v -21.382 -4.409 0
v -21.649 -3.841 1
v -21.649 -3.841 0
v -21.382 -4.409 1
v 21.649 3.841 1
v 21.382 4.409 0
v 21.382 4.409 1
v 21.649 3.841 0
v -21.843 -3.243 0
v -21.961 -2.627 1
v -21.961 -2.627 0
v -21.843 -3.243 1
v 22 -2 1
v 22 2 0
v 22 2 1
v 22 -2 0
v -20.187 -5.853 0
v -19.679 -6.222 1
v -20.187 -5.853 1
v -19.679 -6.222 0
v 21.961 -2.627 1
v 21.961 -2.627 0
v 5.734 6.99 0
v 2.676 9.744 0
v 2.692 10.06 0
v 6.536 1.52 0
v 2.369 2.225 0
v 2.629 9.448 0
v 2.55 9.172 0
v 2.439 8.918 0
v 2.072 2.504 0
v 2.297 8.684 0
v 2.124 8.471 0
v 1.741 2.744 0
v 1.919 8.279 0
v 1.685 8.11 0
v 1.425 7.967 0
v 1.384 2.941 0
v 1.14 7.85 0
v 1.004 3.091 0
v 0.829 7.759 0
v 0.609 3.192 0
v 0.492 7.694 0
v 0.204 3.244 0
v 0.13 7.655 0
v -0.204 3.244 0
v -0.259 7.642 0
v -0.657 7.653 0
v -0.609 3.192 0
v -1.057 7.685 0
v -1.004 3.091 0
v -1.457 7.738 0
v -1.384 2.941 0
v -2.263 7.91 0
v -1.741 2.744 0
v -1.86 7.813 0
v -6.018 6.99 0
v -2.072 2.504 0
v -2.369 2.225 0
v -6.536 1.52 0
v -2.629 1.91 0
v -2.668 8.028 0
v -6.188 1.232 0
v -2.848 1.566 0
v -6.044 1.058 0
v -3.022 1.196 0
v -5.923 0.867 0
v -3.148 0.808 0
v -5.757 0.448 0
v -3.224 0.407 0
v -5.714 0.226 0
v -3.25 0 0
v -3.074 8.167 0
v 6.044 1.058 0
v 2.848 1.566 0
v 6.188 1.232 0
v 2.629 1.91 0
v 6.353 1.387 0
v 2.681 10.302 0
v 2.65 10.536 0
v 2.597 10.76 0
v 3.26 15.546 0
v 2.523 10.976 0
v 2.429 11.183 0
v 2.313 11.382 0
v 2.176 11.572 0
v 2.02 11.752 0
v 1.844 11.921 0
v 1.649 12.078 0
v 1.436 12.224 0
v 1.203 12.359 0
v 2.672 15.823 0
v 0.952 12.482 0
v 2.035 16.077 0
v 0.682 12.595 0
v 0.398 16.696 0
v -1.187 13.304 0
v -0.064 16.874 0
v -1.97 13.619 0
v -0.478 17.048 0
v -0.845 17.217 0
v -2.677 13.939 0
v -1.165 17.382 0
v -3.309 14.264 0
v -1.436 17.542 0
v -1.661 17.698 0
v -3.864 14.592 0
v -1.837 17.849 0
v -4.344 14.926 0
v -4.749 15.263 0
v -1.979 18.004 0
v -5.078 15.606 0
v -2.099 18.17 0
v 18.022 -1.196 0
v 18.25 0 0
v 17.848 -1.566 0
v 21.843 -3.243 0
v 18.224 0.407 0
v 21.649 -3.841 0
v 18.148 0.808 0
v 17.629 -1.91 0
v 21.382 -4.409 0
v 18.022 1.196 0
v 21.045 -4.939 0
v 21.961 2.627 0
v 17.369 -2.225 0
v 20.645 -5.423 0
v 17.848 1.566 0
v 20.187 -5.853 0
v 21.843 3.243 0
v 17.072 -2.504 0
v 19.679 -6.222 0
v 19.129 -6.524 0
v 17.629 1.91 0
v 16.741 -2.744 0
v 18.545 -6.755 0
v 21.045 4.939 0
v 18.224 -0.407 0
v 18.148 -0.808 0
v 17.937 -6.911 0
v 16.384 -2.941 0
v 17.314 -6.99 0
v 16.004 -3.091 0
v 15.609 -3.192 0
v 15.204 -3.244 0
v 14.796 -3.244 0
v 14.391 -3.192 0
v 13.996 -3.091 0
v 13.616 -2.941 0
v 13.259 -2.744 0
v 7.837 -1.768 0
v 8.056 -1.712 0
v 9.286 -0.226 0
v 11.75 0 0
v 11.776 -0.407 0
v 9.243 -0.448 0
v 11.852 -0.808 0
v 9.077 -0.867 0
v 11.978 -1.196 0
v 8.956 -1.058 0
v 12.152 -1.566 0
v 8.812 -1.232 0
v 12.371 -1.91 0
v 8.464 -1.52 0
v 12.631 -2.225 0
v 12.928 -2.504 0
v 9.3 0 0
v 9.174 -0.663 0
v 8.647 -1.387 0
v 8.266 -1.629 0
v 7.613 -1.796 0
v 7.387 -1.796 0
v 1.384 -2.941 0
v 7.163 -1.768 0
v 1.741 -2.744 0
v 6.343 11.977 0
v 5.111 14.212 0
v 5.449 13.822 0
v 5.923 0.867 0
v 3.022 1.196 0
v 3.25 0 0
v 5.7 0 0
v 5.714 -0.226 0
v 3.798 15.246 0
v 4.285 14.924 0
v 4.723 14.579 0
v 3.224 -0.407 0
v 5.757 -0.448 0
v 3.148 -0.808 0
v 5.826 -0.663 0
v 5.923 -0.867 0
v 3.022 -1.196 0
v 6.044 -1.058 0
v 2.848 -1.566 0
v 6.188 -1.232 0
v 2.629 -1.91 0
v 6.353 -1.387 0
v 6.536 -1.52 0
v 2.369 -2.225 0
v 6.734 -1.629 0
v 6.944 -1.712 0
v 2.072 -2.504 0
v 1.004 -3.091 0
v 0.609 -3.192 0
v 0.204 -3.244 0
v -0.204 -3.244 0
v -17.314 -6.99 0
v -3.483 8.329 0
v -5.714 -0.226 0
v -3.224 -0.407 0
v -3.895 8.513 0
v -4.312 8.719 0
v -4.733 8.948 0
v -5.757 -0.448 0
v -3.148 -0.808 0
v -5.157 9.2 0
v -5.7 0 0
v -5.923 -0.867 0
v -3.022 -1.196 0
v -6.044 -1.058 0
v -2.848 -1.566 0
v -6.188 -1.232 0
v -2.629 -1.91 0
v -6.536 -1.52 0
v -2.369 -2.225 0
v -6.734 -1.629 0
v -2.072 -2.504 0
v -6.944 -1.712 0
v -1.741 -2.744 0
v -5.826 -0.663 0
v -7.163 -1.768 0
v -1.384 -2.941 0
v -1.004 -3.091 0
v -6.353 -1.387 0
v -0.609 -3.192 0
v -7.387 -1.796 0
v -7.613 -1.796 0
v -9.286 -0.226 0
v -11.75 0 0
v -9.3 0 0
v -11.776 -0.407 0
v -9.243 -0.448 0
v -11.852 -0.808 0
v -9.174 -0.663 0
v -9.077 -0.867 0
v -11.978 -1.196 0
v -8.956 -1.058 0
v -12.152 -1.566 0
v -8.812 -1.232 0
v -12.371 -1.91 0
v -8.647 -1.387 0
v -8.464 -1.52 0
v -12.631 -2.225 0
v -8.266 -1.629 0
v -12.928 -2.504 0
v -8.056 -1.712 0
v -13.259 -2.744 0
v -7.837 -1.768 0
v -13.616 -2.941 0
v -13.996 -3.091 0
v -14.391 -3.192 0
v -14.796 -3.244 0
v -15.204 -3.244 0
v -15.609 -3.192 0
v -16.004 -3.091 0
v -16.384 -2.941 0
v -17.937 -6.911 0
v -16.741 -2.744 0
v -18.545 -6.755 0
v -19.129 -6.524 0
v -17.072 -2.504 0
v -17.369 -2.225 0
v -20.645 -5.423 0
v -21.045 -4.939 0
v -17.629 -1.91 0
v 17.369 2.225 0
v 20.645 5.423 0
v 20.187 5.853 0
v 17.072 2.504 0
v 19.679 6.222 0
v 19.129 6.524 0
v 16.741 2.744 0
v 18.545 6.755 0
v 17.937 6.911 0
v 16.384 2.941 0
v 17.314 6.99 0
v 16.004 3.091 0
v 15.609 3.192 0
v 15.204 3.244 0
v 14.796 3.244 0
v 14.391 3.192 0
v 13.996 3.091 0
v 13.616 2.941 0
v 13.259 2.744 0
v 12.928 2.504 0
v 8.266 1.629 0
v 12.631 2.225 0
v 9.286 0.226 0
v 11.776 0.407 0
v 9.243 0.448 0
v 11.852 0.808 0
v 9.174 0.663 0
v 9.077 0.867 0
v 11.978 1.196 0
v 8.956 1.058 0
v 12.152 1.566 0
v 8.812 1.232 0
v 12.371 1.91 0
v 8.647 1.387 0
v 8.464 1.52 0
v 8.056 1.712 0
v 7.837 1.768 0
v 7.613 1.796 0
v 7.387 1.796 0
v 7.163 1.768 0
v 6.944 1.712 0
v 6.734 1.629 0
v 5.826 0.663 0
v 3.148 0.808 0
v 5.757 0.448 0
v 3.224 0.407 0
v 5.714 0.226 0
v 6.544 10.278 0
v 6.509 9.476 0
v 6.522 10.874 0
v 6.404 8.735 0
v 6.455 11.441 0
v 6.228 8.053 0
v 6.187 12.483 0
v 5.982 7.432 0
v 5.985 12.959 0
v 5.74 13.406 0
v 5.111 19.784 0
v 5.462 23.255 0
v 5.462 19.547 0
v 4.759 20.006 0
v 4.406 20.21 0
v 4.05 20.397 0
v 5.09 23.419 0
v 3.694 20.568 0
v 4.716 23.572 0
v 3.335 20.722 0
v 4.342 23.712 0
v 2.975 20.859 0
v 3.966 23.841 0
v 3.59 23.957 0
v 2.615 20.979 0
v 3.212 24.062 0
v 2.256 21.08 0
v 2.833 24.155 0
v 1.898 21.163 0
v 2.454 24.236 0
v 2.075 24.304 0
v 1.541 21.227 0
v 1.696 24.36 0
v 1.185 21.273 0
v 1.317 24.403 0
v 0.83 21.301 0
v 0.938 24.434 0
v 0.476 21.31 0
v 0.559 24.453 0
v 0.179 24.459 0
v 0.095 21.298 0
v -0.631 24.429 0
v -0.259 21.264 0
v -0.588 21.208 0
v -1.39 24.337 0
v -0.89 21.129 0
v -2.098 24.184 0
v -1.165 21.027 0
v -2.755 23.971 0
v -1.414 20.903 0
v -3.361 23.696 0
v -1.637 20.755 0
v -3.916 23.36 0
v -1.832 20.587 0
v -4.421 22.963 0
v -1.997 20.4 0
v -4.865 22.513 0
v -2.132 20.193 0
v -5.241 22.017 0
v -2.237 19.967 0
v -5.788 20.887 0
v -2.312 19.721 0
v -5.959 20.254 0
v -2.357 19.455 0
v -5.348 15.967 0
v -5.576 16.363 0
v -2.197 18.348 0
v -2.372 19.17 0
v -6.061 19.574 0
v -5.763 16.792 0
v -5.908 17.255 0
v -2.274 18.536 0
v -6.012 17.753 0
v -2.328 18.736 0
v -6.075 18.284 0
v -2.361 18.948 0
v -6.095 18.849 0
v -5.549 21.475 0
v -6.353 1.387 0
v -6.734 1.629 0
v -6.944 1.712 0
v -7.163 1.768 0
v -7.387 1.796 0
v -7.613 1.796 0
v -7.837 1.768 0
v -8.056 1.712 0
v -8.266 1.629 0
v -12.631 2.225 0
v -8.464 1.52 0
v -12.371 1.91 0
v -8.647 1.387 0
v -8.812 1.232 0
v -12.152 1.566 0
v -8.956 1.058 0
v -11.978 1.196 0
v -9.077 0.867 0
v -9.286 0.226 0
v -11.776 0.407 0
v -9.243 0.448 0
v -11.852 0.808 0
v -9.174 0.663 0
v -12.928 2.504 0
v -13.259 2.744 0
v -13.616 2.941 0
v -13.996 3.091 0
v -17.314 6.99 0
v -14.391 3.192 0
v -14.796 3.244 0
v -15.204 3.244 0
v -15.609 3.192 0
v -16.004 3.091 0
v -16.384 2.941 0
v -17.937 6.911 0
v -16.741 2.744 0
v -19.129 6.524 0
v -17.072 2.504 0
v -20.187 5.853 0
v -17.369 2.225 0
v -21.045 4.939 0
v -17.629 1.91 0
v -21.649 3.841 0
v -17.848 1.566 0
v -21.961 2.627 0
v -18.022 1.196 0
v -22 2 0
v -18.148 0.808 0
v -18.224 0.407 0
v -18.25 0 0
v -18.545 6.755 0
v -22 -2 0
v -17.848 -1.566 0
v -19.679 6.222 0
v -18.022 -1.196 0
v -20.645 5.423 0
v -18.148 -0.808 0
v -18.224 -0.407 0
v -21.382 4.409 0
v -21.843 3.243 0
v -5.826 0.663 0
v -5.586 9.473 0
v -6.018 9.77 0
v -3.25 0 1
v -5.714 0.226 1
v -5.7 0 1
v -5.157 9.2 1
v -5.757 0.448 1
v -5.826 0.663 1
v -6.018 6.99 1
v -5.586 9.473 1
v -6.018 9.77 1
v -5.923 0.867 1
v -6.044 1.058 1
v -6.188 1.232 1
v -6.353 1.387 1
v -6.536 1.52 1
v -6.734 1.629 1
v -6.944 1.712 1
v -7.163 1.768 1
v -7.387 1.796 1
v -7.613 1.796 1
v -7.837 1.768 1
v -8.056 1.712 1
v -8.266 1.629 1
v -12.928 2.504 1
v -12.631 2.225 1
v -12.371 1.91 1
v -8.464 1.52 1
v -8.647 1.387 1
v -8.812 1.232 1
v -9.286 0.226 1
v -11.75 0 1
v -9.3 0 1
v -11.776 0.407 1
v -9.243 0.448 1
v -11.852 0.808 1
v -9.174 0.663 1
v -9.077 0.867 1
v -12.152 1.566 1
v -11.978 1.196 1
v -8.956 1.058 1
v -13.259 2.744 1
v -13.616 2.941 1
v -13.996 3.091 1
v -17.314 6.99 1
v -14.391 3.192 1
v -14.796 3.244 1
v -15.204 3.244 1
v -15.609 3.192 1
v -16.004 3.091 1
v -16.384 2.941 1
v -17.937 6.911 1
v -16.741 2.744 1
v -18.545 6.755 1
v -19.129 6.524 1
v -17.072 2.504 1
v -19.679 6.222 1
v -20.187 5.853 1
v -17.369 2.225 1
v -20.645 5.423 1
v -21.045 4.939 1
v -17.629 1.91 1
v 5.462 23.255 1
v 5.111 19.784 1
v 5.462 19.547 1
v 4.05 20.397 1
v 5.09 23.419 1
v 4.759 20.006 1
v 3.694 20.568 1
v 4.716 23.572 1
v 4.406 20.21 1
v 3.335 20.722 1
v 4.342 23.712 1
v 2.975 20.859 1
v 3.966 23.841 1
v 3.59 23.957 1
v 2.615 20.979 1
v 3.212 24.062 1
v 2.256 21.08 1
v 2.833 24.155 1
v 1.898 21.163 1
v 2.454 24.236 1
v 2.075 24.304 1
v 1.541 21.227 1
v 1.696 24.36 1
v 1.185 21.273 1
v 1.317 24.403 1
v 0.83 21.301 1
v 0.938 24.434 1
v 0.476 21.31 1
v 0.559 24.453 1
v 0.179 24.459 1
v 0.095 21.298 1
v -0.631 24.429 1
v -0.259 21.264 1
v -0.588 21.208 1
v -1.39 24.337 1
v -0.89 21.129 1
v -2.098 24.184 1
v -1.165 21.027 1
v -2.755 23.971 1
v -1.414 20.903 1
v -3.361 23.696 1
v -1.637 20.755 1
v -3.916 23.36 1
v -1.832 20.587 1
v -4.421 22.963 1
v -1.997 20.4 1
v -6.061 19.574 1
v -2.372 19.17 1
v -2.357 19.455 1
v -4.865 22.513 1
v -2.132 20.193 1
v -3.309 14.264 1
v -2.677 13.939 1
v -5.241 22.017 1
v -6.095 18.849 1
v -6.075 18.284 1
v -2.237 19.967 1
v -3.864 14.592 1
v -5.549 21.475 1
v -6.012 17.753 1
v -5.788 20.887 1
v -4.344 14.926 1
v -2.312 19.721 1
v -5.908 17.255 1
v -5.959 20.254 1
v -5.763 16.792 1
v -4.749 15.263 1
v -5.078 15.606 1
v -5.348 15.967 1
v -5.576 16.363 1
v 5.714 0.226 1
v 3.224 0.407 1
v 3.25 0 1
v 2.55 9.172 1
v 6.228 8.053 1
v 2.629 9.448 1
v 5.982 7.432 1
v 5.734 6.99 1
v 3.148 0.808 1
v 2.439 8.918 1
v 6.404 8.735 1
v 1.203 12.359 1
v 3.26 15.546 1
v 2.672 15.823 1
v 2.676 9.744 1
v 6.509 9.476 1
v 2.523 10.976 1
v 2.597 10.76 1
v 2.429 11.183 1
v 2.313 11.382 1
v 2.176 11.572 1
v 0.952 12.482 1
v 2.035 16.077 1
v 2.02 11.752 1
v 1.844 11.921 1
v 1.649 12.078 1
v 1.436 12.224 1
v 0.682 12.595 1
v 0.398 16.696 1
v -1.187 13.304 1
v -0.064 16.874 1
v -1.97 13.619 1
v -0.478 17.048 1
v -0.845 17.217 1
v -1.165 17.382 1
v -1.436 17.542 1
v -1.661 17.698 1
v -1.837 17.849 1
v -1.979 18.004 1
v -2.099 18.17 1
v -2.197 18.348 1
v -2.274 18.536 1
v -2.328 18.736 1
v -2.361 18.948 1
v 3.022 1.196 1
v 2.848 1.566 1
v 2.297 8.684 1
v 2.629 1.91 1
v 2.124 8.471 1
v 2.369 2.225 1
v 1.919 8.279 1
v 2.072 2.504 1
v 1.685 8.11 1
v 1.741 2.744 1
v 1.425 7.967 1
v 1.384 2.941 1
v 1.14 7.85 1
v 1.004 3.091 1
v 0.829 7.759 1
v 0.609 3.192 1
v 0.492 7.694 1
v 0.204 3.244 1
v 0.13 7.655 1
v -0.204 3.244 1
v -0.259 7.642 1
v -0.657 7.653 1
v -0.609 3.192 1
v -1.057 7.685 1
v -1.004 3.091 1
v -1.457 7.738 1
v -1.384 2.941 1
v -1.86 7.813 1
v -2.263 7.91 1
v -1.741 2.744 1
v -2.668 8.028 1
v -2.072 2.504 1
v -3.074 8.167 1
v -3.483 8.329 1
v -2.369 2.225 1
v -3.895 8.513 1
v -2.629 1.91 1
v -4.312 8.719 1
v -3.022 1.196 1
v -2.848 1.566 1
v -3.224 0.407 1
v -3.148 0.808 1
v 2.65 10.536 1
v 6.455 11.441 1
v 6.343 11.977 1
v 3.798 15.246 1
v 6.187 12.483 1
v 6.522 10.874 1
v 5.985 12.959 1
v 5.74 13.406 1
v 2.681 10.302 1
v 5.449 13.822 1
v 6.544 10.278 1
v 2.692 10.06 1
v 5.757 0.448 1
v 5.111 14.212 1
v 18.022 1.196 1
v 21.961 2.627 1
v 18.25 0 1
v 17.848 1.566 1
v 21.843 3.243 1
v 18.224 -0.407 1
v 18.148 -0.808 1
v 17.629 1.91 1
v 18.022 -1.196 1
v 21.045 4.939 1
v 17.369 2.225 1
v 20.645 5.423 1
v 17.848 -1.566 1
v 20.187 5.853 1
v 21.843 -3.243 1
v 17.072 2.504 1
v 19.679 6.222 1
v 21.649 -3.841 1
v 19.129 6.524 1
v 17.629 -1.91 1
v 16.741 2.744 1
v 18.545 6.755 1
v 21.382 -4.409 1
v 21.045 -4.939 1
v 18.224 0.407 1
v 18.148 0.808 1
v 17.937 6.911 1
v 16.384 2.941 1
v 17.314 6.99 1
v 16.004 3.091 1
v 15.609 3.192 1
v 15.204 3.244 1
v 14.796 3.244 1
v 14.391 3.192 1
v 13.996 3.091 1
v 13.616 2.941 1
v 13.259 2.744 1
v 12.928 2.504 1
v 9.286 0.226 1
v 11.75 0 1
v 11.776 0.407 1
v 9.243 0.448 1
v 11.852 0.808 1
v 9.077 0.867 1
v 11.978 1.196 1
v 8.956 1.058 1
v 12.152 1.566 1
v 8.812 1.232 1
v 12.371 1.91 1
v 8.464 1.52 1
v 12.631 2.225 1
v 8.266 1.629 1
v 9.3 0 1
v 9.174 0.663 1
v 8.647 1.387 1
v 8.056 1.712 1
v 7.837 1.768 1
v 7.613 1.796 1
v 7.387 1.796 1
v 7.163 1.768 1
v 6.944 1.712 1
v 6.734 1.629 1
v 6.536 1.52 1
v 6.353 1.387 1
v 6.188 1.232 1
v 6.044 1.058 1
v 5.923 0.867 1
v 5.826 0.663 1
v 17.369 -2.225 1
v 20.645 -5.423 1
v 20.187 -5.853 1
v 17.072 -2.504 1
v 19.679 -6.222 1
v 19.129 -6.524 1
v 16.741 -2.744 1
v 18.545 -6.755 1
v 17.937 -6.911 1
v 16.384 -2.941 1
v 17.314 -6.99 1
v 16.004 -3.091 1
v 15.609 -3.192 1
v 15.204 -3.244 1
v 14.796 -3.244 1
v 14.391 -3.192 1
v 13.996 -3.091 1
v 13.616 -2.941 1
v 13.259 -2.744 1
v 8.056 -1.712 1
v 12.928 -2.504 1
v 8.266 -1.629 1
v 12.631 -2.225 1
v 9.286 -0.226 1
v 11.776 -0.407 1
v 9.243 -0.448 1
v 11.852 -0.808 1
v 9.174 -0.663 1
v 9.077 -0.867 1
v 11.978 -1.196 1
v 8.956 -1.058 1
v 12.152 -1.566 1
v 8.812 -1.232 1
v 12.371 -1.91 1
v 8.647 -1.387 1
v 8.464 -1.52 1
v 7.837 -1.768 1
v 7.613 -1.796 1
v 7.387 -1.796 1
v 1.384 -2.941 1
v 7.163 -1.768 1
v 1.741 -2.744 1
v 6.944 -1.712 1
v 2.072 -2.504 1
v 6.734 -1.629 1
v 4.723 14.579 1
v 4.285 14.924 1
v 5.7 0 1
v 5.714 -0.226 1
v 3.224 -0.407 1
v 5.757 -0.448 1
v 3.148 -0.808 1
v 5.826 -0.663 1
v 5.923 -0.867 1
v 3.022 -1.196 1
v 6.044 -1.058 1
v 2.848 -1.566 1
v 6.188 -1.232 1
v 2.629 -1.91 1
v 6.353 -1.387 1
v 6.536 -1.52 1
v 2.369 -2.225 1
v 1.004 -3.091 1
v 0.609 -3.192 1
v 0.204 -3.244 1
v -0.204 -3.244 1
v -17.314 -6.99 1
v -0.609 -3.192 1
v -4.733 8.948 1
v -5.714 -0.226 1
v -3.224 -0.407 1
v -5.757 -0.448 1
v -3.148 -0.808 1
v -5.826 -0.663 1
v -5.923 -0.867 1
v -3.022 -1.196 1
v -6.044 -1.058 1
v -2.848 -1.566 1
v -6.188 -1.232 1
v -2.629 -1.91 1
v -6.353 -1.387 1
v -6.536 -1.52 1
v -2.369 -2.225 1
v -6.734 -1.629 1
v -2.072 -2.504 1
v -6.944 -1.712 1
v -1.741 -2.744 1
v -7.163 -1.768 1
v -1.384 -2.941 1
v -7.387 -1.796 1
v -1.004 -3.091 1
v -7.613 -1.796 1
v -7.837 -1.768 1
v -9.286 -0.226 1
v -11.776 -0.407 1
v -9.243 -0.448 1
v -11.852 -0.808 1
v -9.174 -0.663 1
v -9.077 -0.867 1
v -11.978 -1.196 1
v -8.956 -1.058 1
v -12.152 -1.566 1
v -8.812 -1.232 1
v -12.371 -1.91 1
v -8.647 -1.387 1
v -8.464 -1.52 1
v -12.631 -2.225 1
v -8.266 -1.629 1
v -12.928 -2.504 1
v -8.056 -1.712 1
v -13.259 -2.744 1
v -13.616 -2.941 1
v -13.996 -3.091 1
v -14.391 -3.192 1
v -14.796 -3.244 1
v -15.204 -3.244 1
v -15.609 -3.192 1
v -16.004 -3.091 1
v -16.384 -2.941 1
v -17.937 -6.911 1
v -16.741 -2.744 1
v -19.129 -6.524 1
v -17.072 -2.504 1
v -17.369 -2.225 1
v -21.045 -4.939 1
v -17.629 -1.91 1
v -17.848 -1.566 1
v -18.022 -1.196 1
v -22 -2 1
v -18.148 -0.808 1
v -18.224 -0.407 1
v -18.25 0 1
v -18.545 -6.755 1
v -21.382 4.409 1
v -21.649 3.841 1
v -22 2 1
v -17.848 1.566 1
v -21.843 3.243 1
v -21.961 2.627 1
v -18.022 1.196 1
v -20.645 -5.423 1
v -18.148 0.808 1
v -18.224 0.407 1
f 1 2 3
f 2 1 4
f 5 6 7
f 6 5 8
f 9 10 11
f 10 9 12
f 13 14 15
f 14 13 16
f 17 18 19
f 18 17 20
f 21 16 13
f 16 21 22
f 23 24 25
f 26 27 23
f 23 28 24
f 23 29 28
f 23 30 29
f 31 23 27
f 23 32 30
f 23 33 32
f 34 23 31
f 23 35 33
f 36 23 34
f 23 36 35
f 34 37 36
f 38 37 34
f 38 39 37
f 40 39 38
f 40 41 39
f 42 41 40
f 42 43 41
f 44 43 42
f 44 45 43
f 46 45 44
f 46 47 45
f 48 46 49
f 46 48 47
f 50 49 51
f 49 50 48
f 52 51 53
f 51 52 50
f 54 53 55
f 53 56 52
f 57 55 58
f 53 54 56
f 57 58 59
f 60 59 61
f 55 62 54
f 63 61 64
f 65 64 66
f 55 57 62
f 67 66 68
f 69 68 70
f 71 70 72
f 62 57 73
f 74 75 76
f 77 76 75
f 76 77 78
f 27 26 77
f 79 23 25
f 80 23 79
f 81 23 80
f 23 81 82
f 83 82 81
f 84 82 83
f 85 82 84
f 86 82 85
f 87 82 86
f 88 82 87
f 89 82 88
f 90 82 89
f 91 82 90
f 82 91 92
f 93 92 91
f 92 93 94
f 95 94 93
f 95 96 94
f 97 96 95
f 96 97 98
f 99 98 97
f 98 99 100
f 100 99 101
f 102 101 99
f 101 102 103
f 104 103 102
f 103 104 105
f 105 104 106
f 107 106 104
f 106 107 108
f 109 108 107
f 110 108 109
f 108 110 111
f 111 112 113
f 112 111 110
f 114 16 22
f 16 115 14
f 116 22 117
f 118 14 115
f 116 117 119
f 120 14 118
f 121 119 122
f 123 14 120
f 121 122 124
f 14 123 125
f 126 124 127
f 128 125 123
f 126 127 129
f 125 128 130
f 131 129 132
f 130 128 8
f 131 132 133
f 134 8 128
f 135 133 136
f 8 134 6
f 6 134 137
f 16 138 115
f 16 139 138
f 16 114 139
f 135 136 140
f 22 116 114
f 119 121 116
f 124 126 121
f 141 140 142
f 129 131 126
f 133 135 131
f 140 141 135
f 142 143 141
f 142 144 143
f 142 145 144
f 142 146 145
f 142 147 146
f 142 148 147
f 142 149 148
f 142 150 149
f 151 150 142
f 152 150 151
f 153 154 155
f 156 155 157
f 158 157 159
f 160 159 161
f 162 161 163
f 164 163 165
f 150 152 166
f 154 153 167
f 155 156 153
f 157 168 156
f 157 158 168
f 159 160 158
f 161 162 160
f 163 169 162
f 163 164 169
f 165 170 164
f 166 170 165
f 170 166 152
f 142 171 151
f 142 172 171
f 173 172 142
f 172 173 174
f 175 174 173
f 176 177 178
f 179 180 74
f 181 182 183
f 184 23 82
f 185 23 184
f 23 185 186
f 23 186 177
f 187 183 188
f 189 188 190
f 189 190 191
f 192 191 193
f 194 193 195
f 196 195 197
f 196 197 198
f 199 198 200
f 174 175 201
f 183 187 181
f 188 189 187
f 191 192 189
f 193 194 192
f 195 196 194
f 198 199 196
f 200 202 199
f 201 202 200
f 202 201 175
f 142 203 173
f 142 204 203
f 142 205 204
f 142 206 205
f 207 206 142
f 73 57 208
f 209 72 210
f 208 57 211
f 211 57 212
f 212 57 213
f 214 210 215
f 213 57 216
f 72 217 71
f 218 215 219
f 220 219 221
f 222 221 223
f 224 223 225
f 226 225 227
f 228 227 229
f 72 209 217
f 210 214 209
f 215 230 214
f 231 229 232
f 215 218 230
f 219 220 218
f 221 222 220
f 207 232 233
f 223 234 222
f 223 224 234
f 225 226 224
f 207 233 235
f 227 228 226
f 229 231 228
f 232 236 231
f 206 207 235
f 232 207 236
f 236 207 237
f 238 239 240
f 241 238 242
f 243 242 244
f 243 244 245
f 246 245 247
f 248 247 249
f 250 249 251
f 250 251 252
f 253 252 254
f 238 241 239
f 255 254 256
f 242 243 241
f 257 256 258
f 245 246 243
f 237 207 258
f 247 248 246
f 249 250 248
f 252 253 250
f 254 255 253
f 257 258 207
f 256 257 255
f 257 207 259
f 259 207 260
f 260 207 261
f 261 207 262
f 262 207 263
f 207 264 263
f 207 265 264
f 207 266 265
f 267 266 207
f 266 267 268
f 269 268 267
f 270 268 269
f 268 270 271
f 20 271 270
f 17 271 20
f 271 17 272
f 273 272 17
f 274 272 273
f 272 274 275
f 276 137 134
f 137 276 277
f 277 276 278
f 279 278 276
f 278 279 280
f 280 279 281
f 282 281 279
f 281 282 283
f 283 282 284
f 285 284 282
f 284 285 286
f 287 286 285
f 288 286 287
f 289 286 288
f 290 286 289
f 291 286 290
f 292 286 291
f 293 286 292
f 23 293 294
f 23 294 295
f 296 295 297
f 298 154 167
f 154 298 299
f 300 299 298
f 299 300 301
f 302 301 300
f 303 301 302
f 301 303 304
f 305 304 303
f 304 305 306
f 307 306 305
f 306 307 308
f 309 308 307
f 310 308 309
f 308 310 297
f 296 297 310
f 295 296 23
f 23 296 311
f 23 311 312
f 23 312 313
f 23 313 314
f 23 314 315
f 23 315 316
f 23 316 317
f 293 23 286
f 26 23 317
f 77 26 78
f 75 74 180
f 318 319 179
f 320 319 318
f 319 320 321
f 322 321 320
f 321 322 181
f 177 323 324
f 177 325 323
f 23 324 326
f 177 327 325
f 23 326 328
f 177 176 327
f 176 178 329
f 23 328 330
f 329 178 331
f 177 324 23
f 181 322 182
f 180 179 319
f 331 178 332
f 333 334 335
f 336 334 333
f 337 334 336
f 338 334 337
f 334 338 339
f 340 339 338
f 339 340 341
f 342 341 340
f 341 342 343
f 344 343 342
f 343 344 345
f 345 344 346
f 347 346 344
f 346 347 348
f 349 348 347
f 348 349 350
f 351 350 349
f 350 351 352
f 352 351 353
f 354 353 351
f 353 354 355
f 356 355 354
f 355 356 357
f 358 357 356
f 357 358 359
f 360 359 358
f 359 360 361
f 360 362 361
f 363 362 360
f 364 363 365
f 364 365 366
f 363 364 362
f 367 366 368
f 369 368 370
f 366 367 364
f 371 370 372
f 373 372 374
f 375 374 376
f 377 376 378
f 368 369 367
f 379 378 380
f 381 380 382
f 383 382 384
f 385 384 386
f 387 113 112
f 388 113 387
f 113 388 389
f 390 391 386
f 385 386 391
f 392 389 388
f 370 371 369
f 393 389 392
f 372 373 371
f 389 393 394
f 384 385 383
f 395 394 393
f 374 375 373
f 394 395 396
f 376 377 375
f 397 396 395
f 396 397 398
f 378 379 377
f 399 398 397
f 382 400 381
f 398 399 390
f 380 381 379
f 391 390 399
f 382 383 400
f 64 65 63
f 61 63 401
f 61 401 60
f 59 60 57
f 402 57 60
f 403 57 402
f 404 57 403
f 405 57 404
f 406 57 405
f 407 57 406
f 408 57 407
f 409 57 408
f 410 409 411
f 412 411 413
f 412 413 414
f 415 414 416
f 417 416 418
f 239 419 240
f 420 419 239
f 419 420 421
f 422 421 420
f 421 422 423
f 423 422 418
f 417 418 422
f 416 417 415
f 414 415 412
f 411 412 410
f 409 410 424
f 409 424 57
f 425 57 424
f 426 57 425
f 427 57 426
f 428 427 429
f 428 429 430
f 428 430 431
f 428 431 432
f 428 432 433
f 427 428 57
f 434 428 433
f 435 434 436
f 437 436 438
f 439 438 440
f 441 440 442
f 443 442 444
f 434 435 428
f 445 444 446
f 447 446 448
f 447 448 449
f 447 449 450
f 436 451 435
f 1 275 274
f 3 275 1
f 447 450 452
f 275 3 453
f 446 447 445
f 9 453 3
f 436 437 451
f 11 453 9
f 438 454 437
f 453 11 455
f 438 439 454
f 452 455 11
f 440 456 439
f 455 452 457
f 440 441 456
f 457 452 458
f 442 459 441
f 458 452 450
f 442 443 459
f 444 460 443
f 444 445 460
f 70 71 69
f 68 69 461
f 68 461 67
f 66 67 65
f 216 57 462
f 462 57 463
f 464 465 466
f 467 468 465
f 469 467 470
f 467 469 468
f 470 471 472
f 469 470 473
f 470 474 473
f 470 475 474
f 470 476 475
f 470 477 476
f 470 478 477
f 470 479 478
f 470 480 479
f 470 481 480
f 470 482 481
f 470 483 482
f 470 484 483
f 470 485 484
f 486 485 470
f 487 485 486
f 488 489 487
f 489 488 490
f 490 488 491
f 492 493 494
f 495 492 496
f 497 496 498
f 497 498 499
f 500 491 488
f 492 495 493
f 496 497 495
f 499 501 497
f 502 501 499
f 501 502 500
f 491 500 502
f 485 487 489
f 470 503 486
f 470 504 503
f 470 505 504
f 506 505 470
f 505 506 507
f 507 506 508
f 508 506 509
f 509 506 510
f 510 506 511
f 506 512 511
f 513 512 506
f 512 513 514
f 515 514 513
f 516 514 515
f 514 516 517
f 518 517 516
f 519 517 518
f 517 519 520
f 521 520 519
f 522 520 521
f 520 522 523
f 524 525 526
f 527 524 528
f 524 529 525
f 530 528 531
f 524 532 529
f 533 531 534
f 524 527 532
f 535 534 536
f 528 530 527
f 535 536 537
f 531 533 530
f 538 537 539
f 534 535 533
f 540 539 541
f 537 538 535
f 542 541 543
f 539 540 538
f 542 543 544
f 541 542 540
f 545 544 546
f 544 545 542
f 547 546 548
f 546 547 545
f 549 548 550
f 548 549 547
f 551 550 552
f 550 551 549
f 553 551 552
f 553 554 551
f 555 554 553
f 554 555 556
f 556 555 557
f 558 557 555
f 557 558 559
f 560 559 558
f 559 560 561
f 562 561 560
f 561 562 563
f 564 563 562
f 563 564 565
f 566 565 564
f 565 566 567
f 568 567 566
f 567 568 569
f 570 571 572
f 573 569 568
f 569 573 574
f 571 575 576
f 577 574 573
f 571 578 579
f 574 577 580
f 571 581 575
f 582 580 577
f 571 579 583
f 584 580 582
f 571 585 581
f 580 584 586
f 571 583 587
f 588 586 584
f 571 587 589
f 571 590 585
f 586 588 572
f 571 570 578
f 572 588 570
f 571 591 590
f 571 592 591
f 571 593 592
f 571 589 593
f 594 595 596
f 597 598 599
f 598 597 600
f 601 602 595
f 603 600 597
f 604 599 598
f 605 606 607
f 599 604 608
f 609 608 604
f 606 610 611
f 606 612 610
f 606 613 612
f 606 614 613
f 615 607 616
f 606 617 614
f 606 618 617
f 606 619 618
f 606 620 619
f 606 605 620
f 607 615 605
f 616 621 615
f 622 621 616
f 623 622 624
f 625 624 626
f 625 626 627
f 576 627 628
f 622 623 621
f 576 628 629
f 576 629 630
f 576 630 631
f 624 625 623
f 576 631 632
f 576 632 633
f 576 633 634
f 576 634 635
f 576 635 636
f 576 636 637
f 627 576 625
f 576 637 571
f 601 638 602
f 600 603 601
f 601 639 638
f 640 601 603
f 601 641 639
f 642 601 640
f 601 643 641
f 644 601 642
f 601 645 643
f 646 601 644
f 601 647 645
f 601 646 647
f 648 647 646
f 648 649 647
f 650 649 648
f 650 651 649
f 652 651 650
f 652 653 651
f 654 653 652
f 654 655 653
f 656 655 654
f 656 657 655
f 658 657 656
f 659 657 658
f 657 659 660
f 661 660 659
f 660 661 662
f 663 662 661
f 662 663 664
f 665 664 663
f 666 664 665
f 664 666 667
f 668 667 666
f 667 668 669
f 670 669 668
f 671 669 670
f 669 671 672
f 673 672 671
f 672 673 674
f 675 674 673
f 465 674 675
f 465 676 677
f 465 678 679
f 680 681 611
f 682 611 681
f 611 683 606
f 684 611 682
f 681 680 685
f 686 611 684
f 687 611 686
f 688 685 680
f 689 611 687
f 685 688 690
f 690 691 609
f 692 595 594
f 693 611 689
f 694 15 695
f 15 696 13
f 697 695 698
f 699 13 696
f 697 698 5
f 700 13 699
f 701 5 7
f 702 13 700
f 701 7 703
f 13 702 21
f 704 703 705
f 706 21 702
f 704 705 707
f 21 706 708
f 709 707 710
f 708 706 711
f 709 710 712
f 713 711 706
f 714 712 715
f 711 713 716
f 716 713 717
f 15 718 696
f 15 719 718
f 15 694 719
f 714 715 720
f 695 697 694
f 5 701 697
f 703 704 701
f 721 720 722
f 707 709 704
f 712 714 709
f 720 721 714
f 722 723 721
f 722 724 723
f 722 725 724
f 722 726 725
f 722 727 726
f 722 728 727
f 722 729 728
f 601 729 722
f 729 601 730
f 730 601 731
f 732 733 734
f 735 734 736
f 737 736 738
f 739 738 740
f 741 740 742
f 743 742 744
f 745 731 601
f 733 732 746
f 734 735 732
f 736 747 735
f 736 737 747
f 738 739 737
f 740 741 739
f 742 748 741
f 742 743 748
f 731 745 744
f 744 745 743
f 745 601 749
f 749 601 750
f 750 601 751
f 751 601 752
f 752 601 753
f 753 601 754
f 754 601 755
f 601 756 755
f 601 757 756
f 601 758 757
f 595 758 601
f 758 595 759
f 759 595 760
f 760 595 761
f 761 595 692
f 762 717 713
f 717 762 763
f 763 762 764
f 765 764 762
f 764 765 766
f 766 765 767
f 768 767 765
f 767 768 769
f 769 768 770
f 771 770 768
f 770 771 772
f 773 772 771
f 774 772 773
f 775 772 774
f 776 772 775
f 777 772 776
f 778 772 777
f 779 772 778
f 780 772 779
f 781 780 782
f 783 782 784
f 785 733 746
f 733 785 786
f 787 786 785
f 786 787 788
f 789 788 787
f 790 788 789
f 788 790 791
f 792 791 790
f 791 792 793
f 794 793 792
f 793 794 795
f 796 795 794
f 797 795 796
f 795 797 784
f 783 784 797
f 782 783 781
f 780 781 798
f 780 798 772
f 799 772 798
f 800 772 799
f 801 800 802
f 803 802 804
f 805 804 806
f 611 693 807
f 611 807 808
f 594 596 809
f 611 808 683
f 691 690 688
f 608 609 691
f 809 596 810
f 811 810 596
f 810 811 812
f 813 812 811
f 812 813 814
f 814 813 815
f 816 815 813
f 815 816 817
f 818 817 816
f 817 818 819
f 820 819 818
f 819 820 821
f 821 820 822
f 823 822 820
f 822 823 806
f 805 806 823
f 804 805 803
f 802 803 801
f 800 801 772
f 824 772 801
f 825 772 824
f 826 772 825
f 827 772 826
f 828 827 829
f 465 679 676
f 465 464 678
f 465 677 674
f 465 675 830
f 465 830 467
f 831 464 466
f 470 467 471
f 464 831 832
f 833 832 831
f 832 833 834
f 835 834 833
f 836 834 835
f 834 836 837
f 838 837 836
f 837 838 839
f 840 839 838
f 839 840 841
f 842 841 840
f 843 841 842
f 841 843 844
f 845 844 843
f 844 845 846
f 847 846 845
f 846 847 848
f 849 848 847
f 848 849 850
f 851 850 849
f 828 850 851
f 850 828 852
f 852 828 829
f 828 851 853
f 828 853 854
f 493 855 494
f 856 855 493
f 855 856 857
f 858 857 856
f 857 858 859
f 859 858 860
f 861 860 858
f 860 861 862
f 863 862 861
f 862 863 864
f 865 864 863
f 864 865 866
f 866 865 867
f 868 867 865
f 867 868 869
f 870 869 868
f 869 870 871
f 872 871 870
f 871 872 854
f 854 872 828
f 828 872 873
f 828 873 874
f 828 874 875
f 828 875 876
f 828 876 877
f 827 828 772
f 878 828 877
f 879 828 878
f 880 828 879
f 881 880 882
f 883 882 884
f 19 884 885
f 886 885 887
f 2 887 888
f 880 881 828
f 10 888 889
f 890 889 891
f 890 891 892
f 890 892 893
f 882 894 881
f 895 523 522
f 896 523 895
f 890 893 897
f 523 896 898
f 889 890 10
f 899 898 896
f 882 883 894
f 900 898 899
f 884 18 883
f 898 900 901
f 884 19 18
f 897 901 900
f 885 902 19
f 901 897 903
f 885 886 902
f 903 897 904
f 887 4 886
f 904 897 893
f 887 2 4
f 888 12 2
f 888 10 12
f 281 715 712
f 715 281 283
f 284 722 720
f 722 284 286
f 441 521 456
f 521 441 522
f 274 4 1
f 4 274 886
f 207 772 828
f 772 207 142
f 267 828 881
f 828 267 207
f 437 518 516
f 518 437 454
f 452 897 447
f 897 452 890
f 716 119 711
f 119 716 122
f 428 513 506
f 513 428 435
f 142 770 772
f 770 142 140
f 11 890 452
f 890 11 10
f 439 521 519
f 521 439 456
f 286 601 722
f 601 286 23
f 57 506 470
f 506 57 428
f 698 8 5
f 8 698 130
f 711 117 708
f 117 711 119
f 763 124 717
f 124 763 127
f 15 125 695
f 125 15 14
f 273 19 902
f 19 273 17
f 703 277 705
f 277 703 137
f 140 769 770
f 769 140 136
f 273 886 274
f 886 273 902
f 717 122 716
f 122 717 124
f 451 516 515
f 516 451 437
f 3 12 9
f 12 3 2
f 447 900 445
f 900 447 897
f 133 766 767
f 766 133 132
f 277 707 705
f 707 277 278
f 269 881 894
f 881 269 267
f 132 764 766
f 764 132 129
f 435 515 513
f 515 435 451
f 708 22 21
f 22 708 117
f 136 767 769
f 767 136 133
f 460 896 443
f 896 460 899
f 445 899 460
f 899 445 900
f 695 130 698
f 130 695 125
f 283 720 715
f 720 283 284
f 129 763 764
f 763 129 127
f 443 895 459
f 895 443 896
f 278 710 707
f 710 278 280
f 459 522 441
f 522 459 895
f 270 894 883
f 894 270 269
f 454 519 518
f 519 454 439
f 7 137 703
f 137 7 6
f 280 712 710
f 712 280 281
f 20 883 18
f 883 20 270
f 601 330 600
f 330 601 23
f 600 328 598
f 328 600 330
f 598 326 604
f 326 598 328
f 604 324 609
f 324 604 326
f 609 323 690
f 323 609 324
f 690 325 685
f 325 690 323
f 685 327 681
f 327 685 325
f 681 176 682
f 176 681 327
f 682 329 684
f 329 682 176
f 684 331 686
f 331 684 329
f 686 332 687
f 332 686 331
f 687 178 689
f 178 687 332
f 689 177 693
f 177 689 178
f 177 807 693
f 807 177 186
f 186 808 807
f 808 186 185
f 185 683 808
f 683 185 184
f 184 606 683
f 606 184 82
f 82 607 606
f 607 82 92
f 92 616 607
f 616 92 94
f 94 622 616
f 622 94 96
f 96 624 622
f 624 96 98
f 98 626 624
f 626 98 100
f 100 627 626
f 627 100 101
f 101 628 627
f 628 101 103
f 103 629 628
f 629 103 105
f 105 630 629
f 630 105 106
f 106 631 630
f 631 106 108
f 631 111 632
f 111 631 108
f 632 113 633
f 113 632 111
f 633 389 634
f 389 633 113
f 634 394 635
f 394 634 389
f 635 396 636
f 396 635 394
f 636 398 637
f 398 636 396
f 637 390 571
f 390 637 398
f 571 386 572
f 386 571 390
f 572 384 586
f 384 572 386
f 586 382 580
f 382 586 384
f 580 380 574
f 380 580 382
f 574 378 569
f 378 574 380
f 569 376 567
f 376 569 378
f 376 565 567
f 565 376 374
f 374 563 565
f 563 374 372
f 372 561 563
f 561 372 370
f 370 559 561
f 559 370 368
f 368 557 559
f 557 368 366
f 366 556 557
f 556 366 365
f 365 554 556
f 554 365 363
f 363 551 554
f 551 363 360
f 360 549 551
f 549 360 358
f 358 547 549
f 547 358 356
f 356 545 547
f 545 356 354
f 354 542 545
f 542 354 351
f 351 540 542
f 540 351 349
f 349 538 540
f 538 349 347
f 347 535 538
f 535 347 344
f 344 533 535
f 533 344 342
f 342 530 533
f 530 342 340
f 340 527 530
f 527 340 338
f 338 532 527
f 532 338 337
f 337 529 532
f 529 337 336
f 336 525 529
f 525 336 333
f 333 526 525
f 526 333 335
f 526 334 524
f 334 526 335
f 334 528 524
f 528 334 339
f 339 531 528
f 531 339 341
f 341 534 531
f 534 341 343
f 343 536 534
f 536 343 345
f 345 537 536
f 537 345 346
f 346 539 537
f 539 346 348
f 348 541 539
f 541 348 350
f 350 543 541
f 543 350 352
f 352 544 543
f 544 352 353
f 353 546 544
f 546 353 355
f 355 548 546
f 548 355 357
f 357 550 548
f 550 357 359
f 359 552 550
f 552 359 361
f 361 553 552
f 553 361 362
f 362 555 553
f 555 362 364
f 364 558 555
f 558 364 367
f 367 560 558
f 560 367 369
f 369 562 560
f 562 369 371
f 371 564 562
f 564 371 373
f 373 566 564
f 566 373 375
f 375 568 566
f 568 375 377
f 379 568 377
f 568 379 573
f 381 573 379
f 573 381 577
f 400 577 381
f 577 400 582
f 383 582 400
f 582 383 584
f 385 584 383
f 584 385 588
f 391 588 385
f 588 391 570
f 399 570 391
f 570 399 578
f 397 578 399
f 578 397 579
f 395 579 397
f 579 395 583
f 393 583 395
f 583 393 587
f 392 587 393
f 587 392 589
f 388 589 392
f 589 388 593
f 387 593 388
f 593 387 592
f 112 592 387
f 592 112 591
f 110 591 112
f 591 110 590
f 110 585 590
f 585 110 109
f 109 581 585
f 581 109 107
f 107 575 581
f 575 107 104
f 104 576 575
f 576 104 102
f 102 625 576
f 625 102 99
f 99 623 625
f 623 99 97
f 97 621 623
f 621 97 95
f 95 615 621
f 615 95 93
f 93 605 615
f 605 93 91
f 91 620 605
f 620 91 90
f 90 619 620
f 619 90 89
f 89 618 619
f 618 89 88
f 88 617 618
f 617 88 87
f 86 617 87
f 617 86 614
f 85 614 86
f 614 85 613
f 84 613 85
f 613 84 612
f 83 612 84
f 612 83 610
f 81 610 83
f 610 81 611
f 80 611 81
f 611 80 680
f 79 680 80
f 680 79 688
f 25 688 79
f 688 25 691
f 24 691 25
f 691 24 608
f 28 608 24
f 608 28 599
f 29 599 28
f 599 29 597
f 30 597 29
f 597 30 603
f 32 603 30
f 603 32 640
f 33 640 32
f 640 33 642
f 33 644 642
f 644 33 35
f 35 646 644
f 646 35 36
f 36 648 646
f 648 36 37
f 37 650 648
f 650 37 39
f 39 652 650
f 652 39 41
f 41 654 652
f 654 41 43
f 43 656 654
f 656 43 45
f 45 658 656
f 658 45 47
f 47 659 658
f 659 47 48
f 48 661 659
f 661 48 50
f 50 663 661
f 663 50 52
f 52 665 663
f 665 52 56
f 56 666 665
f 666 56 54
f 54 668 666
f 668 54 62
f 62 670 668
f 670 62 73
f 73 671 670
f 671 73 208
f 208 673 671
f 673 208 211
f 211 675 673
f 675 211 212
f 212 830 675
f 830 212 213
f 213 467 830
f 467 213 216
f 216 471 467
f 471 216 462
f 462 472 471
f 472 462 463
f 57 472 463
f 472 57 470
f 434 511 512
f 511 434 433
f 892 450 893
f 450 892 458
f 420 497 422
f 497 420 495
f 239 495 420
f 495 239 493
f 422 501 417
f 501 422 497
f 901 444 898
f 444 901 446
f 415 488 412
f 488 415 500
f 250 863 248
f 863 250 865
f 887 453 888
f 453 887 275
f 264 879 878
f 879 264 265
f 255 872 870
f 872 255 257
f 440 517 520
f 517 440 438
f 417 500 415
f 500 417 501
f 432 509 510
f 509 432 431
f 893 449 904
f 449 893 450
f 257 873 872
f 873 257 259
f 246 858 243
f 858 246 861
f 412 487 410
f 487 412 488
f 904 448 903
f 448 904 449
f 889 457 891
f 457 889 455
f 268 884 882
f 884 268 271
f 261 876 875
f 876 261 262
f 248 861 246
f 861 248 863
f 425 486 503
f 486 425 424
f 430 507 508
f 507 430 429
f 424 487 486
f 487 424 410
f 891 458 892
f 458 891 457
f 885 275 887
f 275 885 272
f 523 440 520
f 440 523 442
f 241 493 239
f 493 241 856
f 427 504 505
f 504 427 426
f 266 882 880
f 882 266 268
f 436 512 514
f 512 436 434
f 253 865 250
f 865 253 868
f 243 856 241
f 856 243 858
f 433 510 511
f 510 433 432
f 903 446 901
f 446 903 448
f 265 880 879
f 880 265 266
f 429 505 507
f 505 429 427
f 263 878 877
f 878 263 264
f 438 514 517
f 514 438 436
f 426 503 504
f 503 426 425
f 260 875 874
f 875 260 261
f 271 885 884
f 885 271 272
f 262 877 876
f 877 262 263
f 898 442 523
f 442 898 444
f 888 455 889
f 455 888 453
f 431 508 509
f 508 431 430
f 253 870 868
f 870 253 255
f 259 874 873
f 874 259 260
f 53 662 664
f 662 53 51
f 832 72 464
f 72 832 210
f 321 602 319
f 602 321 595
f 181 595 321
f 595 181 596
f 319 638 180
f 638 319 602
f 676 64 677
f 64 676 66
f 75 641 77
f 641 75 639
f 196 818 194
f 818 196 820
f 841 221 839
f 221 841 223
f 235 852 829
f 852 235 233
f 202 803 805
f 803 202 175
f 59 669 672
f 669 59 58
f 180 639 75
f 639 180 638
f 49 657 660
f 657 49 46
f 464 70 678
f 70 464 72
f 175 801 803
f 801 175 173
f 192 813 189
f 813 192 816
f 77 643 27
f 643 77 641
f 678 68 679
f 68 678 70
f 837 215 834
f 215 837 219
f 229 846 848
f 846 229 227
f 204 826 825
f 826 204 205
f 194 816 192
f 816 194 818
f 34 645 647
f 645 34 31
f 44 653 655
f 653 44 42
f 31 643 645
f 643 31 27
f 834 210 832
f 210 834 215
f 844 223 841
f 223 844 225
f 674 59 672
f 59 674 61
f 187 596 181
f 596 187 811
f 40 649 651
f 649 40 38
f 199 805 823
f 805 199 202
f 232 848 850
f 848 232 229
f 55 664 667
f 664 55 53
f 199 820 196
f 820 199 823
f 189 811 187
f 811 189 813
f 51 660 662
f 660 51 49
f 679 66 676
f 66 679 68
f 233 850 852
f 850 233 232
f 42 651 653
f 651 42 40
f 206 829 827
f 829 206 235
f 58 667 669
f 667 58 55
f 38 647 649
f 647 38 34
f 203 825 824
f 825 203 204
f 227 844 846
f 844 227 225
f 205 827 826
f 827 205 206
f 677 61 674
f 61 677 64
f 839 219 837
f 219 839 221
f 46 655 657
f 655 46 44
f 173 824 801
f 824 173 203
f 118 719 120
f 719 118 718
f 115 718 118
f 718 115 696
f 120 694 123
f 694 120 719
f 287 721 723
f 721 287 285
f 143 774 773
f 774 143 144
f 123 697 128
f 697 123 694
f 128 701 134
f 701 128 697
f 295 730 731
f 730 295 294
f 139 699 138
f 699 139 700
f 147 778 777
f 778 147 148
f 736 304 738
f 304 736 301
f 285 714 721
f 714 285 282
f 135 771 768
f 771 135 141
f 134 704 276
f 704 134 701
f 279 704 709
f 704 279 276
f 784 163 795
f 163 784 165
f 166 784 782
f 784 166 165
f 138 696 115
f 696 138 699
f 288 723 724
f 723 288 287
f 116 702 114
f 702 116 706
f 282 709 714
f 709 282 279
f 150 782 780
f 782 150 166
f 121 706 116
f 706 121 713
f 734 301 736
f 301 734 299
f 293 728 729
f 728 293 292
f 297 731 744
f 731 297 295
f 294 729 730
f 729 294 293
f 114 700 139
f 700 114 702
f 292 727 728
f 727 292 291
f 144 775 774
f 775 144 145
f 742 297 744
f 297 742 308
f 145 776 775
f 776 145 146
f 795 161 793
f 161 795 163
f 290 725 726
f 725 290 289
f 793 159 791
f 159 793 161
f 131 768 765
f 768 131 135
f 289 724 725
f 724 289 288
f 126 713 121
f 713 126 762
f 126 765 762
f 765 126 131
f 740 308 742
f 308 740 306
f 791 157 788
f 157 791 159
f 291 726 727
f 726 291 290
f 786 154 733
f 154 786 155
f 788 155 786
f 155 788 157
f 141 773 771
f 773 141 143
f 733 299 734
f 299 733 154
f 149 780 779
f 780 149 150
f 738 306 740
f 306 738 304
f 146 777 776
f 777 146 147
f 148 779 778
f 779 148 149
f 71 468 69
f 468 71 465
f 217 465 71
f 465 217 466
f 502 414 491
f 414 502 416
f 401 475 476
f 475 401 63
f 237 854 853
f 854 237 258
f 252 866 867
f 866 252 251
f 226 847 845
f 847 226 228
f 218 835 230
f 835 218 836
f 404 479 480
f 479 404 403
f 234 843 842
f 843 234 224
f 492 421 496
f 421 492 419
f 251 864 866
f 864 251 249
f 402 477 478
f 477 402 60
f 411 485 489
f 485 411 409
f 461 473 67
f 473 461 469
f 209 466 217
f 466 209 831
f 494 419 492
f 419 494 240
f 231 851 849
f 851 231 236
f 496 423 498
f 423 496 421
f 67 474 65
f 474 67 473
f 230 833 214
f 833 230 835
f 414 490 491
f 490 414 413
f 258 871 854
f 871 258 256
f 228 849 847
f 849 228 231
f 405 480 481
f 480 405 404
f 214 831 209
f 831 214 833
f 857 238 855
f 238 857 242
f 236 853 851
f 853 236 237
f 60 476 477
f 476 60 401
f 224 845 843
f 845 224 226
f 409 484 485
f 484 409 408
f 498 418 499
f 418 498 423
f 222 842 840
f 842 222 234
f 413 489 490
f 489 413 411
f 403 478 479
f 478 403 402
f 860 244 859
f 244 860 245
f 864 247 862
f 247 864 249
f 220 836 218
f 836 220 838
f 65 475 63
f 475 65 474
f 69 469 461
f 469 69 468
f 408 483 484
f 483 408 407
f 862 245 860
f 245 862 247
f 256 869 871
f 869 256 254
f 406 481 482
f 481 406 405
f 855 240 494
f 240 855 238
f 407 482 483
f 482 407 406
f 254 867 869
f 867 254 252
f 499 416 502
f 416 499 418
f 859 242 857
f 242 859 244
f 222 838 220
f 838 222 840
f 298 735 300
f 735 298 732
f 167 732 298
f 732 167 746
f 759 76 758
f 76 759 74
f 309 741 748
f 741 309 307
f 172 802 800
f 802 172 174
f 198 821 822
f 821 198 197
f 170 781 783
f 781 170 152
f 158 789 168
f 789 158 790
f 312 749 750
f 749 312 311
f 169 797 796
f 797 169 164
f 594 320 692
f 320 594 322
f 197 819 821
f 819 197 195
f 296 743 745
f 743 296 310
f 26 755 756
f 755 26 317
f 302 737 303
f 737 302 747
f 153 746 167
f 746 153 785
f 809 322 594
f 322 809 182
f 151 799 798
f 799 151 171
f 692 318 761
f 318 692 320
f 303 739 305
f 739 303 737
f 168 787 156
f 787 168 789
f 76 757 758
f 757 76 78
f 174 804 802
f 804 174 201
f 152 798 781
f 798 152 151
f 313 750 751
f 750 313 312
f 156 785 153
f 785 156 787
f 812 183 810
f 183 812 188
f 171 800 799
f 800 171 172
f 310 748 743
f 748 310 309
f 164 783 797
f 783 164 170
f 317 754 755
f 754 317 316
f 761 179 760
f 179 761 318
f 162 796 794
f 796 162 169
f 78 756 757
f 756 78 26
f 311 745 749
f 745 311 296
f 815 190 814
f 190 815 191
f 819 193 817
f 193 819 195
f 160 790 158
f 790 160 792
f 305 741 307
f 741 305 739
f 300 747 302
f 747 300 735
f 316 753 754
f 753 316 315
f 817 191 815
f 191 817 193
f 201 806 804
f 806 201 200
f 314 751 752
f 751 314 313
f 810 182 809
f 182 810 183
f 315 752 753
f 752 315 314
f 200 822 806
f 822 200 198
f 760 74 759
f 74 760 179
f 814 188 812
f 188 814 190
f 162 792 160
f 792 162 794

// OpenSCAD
$fn = 50;


difference() {
	union() {
		hull() {
			translate(v = [-17.0000000000, 2.0000000000, 0]) {
				cylinder(h = 1, r = 5);
			}
			translate(v = [17.0000000000, 2.0000000000, 0]) {
				cylinder(h = 1, r = 5);
			}
			translate(v = [-17.0000000000, -2.0000000000, 0]) {
				cylinder(h = 1, r = 5);
			}
			translate(v = [17.0000000000, -2.0000000000, 0]) {
				cylinder(h = 1, r = 5);
			}
		}
		translate(v = [0, 24, 0]) {
			linear_extrude(height = 1) {
				text(font = "DejaVu Sans Mono:style=Bold", halign = "center", size = 19.0000000000, text = "S", valign = "top");
			}
		}
	}
	union() {
		translate(v = [-15.0000000000, 0.0000000000, 0]) {
			translate(v = [0, 0, -100]) {
				cylinder(h = 200, r = 3.2500000000);
			}
		}
		translate(v = [0, 0, -100]) {
			cylinder(h = 200, r = 3.2500000000);
		}
		translate(v = [15.0000000000, 0.0000000000, 0]) {
			translate(v = [0, 0, -100]) {
				cylinder(h = 200, r = 3.2500000000);
			}
		}
		translate(v = [-15.0000000000, 0.0000000000, 0]) {
			translate(v = [0, 0, -100]) {
				cylinder(h = 200, r = 1.8000000000);
			}
		}
		translate(v = [-7.5000000000, 0.0000000000, 0]) {
			translate(v = [0, 0, -100]) {
				cylinder(h = 200, r = 1.8000000000);
			}
		}
		translate(v = [0, 0, -100]) {
			cylinder(h = 200, r = 1.8000000000);
		}
		translate(v = [7.5000000000, 0.0000000000, 0]) {
			translate(v = [0, 0, -100]) {
				cylinder(h = 200, r = 1.8000000000);
			}
		}
		translate(v = [15.0000000000, 0.0000000000, 0]) {
			translate(v = [0, 0, -100]) {
				cylinder(h = 200, r = 1.8000000000);
			}
		}
	}
}
